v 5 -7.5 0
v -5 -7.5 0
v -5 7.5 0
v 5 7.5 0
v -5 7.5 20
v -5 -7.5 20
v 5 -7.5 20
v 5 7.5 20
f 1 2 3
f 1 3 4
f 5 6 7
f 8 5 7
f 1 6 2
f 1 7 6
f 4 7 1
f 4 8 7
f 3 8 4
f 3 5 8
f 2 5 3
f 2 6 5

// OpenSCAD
// See http://reprapide.fr/tutoriel-openscad-formes-2d

linear_extrude(height=20) square ([10,15], center=true);
